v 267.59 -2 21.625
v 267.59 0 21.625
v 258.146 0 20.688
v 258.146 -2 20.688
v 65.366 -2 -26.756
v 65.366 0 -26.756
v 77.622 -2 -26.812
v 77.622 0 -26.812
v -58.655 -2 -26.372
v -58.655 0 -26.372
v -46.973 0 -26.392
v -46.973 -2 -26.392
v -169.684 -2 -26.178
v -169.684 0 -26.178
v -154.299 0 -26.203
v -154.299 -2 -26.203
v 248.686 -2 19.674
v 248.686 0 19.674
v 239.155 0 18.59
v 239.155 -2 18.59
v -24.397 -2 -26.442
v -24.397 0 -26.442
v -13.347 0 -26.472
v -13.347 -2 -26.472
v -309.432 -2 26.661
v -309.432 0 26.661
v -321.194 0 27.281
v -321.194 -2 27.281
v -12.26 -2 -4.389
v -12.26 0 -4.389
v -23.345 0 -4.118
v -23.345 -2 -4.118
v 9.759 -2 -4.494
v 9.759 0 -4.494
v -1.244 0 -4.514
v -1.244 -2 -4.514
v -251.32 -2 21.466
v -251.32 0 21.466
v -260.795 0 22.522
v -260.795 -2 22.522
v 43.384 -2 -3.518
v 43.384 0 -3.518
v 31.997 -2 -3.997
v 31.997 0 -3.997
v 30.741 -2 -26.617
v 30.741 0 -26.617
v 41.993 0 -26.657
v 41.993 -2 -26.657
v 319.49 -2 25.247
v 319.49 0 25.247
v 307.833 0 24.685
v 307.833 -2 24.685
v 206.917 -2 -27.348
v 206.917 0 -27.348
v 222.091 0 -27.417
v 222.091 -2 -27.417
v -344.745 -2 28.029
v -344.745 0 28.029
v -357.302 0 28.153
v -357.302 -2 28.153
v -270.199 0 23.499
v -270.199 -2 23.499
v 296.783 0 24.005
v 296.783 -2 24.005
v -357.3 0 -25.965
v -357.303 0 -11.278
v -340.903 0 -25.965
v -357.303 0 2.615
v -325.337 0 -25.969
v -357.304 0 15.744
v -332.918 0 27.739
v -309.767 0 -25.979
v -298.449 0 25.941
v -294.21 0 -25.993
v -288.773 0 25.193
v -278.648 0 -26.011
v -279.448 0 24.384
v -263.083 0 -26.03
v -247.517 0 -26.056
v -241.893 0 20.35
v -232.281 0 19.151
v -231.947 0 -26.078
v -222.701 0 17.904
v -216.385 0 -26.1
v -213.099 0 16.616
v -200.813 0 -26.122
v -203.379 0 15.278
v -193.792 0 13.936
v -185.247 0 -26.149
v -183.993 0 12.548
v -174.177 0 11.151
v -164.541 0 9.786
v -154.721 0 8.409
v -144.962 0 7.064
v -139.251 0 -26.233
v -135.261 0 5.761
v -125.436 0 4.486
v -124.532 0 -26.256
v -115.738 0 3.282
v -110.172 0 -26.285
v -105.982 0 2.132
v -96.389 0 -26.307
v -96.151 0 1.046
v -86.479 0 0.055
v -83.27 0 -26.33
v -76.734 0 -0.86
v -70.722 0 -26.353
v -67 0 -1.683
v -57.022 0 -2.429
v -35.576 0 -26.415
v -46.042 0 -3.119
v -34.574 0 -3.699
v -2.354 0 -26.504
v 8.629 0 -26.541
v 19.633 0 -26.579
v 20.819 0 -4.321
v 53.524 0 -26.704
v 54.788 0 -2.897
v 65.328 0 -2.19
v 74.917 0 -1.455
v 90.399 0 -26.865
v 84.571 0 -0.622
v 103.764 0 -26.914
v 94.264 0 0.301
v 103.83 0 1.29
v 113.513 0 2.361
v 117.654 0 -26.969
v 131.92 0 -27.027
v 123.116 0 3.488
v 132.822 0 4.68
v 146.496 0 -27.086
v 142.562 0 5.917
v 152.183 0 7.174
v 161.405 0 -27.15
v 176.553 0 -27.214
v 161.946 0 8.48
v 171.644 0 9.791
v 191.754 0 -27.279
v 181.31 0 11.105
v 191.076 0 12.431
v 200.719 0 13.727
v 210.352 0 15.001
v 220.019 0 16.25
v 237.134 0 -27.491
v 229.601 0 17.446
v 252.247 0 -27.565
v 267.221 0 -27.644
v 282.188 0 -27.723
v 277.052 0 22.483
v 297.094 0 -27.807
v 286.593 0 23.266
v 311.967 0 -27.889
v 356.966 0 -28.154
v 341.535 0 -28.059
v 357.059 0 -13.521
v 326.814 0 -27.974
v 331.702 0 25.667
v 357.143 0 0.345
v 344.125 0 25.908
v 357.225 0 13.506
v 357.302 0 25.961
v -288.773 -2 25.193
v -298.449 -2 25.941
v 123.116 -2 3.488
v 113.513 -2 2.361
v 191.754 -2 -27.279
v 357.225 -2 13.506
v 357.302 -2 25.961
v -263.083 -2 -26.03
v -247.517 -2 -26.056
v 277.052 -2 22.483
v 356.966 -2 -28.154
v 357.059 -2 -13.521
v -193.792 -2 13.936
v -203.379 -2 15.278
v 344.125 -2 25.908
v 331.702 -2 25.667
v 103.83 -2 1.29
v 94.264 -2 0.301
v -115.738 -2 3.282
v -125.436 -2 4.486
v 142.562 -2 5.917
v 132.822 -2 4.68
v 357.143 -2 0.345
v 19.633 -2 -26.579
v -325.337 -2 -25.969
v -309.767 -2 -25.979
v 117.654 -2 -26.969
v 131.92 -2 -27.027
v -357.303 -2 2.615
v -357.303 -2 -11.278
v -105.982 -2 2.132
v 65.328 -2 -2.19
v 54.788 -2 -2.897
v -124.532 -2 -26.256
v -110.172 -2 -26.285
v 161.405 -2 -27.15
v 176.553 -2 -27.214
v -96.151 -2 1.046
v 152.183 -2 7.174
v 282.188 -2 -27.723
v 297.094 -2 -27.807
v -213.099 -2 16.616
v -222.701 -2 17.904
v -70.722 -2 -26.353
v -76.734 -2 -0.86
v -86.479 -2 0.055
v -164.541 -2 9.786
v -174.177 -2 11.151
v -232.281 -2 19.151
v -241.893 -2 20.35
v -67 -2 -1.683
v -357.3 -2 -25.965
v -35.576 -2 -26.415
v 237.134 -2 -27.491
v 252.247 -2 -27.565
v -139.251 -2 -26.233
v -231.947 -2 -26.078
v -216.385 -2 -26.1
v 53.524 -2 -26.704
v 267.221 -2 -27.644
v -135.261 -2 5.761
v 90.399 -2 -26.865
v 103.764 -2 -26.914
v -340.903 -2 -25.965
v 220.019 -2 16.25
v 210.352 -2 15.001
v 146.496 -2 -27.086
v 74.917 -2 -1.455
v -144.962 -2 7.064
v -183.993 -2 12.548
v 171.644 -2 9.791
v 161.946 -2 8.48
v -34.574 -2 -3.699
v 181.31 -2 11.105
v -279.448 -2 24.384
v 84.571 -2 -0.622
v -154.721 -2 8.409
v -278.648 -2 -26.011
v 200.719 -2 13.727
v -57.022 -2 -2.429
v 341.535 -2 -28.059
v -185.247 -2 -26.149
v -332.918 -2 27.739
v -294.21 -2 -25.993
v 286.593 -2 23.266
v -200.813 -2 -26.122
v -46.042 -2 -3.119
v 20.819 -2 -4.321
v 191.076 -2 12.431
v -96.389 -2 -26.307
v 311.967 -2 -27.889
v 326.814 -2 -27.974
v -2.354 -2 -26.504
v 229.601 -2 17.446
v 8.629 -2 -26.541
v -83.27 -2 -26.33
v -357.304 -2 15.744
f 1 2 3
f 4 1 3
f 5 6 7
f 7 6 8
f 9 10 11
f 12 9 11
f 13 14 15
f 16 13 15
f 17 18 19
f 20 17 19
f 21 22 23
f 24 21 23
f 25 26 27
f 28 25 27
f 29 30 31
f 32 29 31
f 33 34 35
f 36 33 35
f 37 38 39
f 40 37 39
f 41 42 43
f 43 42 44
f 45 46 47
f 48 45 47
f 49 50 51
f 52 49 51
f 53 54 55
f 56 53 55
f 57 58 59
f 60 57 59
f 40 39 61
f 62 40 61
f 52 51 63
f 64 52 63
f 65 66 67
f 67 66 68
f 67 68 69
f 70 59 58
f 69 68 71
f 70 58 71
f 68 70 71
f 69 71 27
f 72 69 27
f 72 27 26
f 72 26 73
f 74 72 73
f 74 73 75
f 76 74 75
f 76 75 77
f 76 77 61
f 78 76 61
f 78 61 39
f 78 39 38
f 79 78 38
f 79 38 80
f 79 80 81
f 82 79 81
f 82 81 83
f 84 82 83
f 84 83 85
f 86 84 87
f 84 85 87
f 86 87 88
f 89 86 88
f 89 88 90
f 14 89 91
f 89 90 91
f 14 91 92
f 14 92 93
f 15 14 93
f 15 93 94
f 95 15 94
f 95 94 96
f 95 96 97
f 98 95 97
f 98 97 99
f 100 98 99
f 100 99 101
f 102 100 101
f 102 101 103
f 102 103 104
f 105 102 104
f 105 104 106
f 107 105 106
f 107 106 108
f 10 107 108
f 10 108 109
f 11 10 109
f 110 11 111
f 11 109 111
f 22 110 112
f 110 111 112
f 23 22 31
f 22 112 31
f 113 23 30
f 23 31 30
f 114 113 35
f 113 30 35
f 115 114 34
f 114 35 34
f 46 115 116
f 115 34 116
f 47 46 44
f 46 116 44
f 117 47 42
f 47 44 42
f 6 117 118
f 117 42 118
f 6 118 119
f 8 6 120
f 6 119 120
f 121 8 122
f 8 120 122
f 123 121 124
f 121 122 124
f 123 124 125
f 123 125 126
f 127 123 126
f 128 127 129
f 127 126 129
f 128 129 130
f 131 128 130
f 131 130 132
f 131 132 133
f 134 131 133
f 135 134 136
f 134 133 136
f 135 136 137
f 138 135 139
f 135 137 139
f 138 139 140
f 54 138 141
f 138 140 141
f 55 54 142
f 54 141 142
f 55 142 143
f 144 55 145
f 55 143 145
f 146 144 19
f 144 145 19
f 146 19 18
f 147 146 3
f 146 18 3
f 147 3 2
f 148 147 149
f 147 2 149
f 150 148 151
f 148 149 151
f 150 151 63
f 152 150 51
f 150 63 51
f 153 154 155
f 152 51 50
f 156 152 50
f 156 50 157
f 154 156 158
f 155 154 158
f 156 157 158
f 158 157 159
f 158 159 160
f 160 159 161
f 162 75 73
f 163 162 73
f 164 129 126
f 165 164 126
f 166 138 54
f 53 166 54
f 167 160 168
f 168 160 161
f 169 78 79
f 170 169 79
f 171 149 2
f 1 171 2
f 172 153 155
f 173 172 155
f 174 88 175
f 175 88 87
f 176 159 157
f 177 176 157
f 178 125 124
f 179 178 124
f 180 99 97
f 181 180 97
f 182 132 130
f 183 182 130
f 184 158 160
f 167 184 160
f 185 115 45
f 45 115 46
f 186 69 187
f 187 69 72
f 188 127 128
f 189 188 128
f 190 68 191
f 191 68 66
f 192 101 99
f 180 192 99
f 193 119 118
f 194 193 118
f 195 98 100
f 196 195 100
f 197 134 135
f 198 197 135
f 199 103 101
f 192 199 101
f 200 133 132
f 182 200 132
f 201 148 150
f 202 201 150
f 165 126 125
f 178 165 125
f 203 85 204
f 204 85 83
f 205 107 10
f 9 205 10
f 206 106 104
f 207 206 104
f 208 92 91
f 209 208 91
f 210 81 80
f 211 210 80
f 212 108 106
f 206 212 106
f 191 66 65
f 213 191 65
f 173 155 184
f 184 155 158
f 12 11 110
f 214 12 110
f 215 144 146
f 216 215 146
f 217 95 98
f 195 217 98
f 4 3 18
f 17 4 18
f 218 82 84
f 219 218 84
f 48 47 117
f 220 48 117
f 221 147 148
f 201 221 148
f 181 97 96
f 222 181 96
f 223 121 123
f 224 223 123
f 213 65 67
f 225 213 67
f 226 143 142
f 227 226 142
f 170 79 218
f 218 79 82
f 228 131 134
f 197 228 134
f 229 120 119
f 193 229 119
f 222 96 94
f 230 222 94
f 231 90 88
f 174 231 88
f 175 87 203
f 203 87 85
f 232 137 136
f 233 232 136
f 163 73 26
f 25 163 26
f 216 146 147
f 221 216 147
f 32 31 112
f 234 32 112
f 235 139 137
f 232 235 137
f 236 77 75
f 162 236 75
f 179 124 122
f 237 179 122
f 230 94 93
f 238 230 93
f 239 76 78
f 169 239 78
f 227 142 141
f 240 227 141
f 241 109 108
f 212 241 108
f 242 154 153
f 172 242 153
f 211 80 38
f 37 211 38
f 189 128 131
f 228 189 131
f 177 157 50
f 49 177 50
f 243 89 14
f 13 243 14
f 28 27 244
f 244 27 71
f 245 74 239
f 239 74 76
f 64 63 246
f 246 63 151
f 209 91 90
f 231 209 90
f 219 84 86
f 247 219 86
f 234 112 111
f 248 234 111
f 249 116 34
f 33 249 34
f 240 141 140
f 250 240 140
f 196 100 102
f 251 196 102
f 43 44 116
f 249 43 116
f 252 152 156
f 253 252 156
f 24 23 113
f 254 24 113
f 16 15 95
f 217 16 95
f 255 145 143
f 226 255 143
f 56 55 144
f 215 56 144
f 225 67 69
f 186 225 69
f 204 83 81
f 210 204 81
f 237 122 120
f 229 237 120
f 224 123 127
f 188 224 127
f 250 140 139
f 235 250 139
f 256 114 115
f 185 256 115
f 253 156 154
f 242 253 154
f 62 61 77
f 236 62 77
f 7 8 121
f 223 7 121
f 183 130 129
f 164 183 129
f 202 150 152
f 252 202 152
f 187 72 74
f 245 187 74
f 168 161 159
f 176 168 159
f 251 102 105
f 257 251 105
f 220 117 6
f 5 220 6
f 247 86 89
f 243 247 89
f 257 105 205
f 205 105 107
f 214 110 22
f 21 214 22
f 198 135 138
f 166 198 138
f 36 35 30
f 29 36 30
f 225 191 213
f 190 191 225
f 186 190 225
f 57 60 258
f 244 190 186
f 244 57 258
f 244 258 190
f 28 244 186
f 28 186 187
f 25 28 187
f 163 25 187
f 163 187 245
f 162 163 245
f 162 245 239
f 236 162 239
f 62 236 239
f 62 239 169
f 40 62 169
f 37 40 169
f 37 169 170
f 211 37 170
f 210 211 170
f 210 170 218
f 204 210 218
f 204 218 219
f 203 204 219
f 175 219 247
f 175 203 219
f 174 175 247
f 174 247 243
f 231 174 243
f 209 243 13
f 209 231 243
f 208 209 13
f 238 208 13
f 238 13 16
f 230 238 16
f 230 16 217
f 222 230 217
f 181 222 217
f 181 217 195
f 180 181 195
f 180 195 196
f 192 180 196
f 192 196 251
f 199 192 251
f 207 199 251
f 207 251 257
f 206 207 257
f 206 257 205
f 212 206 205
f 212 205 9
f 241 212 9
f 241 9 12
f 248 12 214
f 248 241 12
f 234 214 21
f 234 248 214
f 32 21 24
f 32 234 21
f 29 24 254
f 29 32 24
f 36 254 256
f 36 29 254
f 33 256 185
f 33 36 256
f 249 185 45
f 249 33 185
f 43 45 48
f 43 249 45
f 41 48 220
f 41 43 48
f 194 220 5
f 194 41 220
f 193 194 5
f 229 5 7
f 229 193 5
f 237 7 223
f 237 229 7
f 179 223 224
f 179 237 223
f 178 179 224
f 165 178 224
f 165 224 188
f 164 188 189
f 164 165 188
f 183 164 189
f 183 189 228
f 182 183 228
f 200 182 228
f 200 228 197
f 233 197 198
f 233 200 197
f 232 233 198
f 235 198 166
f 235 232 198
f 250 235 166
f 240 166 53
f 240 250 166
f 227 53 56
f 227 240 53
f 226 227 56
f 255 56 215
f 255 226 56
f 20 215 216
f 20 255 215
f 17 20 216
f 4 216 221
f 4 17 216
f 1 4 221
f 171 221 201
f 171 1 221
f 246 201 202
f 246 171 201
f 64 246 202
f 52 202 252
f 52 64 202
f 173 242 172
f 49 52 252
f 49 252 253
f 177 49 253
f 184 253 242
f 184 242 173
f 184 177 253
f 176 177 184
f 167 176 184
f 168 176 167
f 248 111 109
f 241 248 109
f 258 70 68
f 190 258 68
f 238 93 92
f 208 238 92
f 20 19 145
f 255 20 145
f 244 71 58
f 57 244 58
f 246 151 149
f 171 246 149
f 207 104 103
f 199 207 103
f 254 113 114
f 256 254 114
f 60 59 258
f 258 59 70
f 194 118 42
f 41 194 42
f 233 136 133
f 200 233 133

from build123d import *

# Parameters (mm, degrees)
F1_DEPTH = 2


with BuildPart() as f1:
    # F0 (on Front) → F1 (new body)
    with BuildSketch(Plane.XZ):
        Polygon((341.534929, -28.058502), (356.966048, -28.153636), (357.058567, -13.520987), (357.14314, 0.344884), (357.225435, 13.506259), (357.302116, 25.960613), (344.124817, 25.907653), (331.702072, 25.667022), (319.490137, 25.24664), (307.833444, 24.685407), (296.7833, 24.004949), (286.593086, 23.266411), (277.052342, 22.482843), (267.589855, 21.624513), (258.145719, 20.687782), (248.686227, 19.674382), (239.154539, 18.589995), (229.600551, 17.446419), (220.018542, 16.249525), (210.352012, 15.001289), (200.719203, 13.727049), (191.075985, 12.431023), (181.310001, 11.105342), (171.644371, 9.790678), (161.946013, 8.479502), (152.183263, 7.173676), (142.562253, 5.916581), (132.821793, 4.680022), (123.116429, 3.48767), (113.512568, 2.360951), (103.82999, 1.289697), (94.263922, 0.300939), (84.571442, -0.62175), (74.917203, -1.454715), (65.32775, -2.190237), (54.787732, -2.897463), (43.383575, -3.518085), (31.996695, -3.996672), (20.818726, -4.321094), (9.758981, -4.493711), (-1.244042, -4.513684), (-12.259593, -4.388977), (-23.345099, -4.118193), (-34.573903, -3.699333), (-46.041869, -3.119472), (-57.022238, -2.428583), (-66.99951, -1.682607), (-76.73368, -0.860196), (-86.478549, 0.054639), (-96.15119, 1.045739), (-105.981589, 2.131847), (-115.737887, 3.28168), (-125.436307, 4.486239), (-135.260845, 5.760683), (-144.961603, 7.06375), (-154.720782, 8.409021), (-164.54094, 9.785917), (-174.176907, 11.15122), (-183.992813, 12.548345), (-193.792265, 13.935816), (-203.378683, 15.27843), (-213.098511, 16.616009), (-222.701278, 17.904468), (-232.280879, 19.15123), (-241.893018, 20.350003), (-251.319585, 21.466152), (-260.794959, 22.522131), (-270.19885, 23.499102), (-279.448453, 24.383728), (-288.772861, 25.192871), (-298.449102, 25.940754), (-309.432381, 26.661025), (-321.194351, 27.28068), (-332.918315, 27.739166), (-344.744725, 28.028748), (-357.302139, 28.152693), (-357.303667, 15.744074), (-357.302646, 2.61454), (-357.303246, -11.277673), (-357.30003, -25.965329), (-340.90283, -25.965152), (-325.336537, -25.969401), (-309.766801, -25.979251), (-294.209635, -25.992532), (-278.648307, -26.010654), (-263.082864, -26.030401), (-247.517312, -26.055765), (-231.946501, -26.078058), (-216.384599, -26.10002), (-200.812666, -26.121751), (-185.247179, -26.149036), (-169.684106, -26.178218), (-154.298815, -26.203223), (-139.251067, -26.232723), (-124.531818, -26.256303), (-110.172251, -26.2848), (-96.388804, -26.306807), (-83.269845, -26.329855), (-70.722042, -26.353187), (-58.65545, -26.372293), (-46.972701, -26.391933), (-35.575717, -26.414697), (-24.397132, -26.441673), (-13.347235, -26.471578), (-2.353553, -26.504394), (8.629086, -26.54073), (19.633059, -26.579393), (30.740721, -26.617289), (41.99277, -26.656967), (53.523999, -26.70359), (65.366453, -26.75632), (77.621744, -26.812276), (90.399196, -26.864686), (103.763584, -26.913837), (117.654138, -26.968942), (131.92007, -27.026549), (146.496204, -27.086329), (161.404867, -27.149542), (176.55296, -27.21422), (191.754428, -27.278819), (206.91672, -27.348047), (222.09071, -27.417026), (237.133835, -27.491316), (252.246593, -27.564702), (267.221448, -27.644065), (282.187505, -27.722712), (297.093788, -27.806754), (311.967113, -27.888843), (326.813762, -27.97379), align=None)
    extrude(amount=F1_DEPTH)


solid = f1.part
